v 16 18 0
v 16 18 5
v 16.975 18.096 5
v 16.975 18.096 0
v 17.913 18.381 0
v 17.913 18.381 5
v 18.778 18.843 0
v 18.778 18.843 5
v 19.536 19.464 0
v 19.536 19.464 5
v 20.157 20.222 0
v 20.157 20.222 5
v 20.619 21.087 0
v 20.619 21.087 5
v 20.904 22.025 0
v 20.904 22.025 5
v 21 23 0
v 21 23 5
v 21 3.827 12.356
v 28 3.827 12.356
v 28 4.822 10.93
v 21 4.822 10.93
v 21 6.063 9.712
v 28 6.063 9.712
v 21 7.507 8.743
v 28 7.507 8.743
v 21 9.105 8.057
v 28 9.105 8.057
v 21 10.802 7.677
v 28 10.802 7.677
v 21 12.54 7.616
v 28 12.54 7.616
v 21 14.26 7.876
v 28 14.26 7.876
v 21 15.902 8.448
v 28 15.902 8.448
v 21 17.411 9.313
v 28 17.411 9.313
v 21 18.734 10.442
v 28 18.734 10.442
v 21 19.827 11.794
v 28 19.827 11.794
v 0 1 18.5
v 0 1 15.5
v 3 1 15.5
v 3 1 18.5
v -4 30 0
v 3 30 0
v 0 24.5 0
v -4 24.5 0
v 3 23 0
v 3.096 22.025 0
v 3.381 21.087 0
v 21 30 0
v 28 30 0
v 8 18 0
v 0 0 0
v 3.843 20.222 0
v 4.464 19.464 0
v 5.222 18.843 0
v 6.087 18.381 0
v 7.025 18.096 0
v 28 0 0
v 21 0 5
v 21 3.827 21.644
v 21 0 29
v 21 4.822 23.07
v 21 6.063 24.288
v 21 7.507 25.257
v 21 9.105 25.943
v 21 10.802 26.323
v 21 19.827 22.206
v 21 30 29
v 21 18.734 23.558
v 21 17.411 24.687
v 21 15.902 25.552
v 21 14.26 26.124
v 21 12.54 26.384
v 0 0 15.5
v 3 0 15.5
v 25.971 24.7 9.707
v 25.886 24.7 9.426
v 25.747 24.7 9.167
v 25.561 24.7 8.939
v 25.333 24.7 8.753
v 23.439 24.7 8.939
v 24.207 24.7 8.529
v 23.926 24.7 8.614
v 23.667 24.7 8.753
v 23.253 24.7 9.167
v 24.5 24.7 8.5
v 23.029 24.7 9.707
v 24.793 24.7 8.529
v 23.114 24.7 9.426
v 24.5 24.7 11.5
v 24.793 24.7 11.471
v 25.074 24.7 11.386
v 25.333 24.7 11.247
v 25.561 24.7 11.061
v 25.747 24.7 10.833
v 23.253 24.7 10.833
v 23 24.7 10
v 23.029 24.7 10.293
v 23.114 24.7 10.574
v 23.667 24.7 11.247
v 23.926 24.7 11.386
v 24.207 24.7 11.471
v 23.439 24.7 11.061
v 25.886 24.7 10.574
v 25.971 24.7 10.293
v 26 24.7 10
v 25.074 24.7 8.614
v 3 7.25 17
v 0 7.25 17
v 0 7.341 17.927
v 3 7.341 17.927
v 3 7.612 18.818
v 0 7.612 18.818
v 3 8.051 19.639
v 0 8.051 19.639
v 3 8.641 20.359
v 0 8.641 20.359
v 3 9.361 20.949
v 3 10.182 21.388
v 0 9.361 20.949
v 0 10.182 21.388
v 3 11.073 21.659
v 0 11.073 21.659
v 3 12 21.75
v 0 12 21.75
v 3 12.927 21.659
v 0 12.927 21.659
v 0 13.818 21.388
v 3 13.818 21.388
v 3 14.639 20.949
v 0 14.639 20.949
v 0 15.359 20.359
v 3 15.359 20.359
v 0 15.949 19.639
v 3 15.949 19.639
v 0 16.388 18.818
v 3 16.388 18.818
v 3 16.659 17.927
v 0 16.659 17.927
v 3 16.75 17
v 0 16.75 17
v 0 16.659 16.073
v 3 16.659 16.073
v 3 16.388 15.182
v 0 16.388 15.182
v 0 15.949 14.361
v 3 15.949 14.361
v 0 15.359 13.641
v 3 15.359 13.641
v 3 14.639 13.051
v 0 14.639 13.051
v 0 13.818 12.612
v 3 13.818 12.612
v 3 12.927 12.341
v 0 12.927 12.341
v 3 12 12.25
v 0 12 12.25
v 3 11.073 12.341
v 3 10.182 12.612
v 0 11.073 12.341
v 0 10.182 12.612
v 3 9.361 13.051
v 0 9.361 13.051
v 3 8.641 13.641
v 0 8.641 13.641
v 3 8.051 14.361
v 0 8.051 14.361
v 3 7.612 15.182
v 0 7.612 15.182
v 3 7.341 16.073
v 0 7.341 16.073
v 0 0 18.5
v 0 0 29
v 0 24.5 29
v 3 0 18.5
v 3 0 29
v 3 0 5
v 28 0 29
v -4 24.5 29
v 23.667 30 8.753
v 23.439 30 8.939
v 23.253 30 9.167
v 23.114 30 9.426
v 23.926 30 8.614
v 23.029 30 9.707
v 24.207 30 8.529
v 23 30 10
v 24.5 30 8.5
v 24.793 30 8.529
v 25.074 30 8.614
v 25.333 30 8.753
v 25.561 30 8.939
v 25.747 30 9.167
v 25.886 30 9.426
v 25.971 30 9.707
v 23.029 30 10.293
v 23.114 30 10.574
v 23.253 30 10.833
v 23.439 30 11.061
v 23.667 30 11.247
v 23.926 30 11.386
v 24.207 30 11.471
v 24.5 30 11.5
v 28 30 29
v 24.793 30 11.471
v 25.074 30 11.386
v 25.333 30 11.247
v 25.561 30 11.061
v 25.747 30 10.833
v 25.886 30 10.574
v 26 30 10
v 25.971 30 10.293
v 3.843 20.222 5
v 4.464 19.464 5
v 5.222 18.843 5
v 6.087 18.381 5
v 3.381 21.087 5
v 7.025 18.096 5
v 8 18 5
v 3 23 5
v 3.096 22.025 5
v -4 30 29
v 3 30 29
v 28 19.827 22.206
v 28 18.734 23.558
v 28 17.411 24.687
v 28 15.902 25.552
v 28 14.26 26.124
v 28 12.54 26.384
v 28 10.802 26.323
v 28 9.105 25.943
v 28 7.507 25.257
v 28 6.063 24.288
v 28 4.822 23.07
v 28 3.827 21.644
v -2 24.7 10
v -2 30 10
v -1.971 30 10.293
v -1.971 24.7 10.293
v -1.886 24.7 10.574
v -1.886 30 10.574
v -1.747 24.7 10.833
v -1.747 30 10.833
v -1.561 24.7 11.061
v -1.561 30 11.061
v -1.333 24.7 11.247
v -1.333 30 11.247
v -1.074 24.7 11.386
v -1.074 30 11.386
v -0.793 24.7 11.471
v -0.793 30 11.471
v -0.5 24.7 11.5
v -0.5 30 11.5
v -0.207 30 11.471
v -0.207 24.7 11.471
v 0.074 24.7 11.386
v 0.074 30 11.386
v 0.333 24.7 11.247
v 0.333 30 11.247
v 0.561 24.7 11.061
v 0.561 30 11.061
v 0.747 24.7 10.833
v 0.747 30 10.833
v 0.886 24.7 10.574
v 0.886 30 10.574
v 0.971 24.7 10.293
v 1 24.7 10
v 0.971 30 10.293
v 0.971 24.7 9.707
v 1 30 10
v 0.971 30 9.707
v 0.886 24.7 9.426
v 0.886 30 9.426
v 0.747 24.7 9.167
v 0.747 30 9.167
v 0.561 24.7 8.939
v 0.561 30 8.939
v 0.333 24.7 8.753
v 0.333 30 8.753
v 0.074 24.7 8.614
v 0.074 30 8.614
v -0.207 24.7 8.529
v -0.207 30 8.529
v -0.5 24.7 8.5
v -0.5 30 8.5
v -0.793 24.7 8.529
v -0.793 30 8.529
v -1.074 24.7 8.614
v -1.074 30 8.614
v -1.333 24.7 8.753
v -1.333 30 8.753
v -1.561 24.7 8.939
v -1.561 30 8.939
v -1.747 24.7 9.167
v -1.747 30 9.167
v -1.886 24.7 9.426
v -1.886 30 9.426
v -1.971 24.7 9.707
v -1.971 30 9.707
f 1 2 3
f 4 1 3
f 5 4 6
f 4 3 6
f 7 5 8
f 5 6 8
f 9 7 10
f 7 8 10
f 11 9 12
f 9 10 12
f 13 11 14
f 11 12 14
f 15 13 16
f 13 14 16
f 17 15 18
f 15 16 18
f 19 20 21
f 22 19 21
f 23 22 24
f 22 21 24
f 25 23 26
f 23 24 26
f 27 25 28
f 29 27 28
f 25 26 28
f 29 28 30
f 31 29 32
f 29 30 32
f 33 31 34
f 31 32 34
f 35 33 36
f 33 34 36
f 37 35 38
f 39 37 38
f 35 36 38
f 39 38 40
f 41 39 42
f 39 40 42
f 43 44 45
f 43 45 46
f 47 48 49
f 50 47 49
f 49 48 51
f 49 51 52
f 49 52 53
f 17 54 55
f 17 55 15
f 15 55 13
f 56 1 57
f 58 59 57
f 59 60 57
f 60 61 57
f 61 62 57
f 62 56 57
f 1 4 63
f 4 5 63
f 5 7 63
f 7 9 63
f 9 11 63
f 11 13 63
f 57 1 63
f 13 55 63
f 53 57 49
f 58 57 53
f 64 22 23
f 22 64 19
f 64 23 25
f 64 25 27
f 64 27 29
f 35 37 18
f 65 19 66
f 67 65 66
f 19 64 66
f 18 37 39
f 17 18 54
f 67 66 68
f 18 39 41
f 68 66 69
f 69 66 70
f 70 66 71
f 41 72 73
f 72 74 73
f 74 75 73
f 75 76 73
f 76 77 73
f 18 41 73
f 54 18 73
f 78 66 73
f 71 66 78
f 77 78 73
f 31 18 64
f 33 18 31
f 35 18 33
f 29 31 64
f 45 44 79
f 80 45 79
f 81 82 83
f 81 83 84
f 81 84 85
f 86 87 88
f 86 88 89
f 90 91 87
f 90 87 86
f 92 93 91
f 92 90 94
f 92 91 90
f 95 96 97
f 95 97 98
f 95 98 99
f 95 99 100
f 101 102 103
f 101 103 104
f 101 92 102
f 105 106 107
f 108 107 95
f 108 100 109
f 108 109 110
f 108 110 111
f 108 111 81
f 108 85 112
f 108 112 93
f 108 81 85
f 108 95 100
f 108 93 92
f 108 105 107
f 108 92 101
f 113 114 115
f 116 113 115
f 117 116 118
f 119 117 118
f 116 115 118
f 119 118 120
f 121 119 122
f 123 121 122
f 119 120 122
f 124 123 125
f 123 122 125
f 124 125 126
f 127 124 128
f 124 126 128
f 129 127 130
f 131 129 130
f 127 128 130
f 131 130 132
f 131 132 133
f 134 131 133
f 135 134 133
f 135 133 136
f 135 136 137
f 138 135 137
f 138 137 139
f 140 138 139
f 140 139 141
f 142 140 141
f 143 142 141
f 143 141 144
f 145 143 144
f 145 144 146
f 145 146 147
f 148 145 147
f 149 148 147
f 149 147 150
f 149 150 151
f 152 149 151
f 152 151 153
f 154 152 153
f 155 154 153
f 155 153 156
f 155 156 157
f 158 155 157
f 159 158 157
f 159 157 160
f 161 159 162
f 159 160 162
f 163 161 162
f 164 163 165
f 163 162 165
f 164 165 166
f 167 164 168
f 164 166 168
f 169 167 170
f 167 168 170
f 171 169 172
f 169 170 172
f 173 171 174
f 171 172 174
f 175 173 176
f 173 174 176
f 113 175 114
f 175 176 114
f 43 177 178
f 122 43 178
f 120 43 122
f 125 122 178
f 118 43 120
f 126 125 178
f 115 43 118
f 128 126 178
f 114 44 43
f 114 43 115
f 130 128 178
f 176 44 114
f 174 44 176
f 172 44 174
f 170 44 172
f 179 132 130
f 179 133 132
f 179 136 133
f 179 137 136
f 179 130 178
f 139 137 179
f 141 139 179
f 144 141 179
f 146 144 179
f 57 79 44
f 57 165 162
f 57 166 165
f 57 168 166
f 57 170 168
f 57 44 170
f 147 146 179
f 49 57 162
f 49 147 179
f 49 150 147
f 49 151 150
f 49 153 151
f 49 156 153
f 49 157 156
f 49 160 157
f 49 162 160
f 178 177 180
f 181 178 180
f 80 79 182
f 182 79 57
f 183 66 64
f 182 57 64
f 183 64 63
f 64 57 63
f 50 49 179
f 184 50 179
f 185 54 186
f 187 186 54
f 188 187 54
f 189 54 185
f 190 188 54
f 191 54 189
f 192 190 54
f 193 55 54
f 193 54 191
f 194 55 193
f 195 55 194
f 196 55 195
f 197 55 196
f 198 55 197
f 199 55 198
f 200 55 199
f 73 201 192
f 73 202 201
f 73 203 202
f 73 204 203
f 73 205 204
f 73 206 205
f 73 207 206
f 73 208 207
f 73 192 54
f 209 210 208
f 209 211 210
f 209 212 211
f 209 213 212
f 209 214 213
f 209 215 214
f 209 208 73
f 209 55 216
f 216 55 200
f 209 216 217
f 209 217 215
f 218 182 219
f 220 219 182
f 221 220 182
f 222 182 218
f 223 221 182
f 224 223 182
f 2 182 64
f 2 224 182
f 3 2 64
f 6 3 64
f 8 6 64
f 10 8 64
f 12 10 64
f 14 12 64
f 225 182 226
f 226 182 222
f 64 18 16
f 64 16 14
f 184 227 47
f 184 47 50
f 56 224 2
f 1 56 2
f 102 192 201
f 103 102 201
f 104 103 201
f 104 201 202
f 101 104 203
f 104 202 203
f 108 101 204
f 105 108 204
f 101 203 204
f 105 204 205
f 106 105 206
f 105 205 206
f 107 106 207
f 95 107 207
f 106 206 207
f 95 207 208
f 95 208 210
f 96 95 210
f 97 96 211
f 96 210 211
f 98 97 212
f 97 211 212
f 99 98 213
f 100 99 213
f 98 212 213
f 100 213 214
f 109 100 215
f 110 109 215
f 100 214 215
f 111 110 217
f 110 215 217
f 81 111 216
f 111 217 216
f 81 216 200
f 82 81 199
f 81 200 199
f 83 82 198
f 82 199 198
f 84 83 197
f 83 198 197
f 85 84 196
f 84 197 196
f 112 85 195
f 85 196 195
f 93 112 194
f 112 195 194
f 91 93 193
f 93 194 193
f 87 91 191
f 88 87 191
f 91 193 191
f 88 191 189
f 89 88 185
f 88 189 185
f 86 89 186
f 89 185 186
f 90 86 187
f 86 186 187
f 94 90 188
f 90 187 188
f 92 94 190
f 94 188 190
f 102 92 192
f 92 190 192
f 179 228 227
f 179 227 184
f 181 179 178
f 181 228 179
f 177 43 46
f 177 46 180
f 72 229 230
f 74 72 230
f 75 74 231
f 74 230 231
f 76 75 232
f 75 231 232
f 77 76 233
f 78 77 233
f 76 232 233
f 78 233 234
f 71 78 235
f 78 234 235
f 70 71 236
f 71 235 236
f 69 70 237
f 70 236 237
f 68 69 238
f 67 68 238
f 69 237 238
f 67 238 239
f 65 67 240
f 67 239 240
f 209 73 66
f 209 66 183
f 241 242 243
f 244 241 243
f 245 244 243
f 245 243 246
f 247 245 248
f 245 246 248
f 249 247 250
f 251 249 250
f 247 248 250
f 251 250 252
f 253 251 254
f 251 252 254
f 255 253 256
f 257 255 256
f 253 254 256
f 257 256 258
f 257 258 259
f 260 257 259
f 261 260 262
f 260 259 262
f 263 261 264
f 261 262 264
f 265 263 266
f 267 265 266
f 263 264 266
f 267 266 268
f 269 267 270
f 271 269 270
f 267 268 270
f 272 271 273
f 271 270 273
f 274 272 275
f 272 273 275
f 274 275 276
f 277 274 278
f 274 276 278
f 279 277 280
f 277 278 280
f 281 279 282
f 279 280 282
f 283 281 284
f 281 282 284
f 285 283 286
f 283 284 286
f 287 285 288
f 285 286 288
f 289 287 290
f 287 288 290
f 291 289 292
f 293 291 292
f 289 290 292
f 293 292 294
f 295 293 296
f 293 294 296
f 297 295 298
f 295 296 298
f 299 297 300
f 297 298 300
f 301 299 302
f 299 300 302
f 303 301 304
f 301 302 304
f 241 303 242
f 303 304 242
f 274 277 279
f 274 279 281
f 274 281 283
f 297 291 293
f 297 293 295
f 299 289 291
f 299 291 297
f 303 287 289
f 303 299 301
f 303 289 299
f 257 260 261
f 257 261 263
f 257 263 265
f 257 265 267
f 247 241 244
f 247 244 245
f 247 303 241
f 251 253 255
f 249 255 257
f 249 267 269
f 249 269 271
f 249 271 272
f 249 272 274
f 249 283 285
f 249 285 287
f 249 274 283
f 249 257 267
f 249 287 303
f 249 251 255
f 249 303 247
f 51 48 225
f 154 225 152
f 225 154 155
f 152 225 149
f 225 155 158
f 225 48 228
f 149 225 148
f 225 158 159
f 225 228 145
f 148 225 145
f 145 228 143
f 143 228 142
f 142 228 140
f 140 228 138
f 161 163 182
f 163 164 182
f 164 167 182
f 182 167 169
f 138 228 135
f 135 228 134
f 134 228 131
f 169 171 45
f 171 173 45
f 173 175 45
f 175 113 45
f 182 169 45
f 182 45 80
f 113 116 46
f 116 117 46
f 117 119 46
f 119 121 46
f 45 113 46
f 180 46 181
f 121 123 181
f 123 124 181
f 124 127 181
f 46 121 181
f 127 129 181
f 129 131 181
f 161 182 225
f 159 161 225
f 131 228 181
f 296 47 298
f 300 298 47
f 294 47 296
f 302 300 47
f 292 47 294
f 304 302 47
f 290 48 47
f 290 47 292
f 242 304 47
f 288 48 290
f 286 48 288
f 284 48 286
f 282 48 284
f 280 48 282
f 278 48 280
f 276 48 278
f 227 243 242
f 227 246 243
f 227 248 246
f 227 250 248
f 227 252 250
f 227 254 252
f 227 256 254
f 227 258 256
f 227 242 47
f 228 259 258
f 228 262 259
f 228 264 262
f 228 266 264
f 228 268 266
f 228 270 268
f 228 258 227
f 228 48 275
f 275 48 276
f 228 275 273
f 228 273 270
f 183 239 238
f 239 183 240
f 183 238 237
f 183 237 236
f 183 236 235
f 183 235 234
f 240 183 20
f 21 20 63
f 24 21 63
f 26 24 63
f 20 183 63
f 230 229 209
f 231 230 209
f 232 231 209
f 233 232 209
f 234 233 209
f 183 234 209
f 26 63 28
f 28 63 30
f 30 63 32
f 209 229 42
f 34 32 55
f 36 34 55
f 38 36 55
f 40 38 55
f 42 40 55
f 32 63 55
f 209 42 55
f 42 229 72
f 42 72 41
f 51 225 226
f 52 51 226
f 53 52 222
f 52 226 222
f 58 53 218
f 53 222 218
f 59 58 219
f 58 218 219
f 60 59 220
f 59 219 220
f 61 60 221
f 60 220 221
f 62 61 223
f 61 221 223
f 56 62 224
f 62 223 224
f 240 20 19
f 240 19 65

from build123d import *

# Parameters (mm, degrees)
BOX_W           = 28
BOX_H           = 30
BOX_DEPTH       = 5
SKETCH_W        = 3
SKETCH_H        = 30
SKETCH_W_2      = 7
PAD_DEPTH       = 24
SKETCH002_R     = 4.75
SKETCH002_W     = 1
SKETCH002_H     = 3
POCKET_DEPTH    = 4
POCKET001_DEPTH = 10
SKETCH003_W     = 5.5
SKETCH003_H     = 29
PAD001_DEPTH    = 4
SKETCH004_R     = 1.5
POCKET002_DEPTH = 5.3
POCKET003_DEPTH = 5


with BuildPart() as part:
    # Box → Box (new body)
    with BuildSketch(Plane.XY):
        with Locations((14, 15)):
            Rectangle(BOX_W, BOX_H)
    extrude(amount=BOX_DEPTH)

    # Sketch → Pad (new body)
    with BuildSketch(Plane.XY.offset(5)):
        with Locations((1.5, 15)):
            Rectangle(SKETCH_W, SKETCH_H)
        with Locations((24.5, 15)):
            Rectangle(SKETCH_W_2, SKETCH_H)
    extrude(amount=PAD_DEPTH)

    # Sketch002 → Pocket (cut, symmetric)
    with BuildSketch(Plane(origin=(0, 0, 0), x_dir=(0, -1, 0), z_dir=(-1, 0, 0))):
        with Locations((-12, 17)):
            Circle(SKETCH002_R)
        with Locations((-0.5, 17)):
            Rectangle(SKETCH002_W, SKETCH002_H)
    extrude(amount=POCKET_DEPTH, both=True, mode=Mode.SUBTRACT)

    # Sketch001 → Pocket001 (cut)
    with BuildSketch(Plane.YZ.offset(28)):
        with BuildLine():
            Line((19.827027, 22.20554), (19.827027, 11.79446))
            ThreePointArc((3.827027, 12.356455), (11.670031, 7.605793), (19.827027, 11.79446))
            Line((3.827027, 12.356455), (3.827027, 21.643545))
            ThreePointArc((19.827027, 22.20554), (11.670031, 26.394207), (3.827027, 21.643545))
        make_face()
    extrude(amount=-POCKET001_DEPTH, mode=Mode.SUBTRACT)

    # Sketch003 → Pad001 (new body)
    with BuildSketch(Plane(origin=(0, 0, 0), x_dir=(0, -1, 0), z_dir=(-1, 0, 0))):
        with Locations((-27.25, 14.5)):
            Rectangle(SKETCH003_W, SKETCH003_H)
    extrude(amount=PAD001_DEPTH)

    # Sketch004 → Pocket002 (cut)
    with BuildSketch(Plane(origin=(0, 30, 0), x_dir=(-1, 0, 0), z_dir=(0, 1, 0))):
        with Locations((-24.5, 10)):
            Circle(SKETCH004_R)
        with Locations((0.5, 10)):
            Circle(SKETCH004_R)
    extrude(amount=-POCKET002_DEPTH, mode=Mode.SUBTRACT)

    # Sketch005 → Pocket003 (cut)
    with BuildSketch(Plane.XY.offset(5)):
        with BuildLine():
            Line((21, 30), (3, 30))
            Line((3, 30), (3, 23))
            ThreePointArc((3, 23), (4.464466, 19.464466), (8, 18))
            Line((8, 18), (16, 18))
            ThreePointArc((16, 18), (19.535534, 19.464466), (21, 23))
            Line((21, 23), (21, 30))
        make_face()
    extrude(amount=-POCKET003_DEPTH, mode=Mode.SUBTRACT)


solid = part.part
